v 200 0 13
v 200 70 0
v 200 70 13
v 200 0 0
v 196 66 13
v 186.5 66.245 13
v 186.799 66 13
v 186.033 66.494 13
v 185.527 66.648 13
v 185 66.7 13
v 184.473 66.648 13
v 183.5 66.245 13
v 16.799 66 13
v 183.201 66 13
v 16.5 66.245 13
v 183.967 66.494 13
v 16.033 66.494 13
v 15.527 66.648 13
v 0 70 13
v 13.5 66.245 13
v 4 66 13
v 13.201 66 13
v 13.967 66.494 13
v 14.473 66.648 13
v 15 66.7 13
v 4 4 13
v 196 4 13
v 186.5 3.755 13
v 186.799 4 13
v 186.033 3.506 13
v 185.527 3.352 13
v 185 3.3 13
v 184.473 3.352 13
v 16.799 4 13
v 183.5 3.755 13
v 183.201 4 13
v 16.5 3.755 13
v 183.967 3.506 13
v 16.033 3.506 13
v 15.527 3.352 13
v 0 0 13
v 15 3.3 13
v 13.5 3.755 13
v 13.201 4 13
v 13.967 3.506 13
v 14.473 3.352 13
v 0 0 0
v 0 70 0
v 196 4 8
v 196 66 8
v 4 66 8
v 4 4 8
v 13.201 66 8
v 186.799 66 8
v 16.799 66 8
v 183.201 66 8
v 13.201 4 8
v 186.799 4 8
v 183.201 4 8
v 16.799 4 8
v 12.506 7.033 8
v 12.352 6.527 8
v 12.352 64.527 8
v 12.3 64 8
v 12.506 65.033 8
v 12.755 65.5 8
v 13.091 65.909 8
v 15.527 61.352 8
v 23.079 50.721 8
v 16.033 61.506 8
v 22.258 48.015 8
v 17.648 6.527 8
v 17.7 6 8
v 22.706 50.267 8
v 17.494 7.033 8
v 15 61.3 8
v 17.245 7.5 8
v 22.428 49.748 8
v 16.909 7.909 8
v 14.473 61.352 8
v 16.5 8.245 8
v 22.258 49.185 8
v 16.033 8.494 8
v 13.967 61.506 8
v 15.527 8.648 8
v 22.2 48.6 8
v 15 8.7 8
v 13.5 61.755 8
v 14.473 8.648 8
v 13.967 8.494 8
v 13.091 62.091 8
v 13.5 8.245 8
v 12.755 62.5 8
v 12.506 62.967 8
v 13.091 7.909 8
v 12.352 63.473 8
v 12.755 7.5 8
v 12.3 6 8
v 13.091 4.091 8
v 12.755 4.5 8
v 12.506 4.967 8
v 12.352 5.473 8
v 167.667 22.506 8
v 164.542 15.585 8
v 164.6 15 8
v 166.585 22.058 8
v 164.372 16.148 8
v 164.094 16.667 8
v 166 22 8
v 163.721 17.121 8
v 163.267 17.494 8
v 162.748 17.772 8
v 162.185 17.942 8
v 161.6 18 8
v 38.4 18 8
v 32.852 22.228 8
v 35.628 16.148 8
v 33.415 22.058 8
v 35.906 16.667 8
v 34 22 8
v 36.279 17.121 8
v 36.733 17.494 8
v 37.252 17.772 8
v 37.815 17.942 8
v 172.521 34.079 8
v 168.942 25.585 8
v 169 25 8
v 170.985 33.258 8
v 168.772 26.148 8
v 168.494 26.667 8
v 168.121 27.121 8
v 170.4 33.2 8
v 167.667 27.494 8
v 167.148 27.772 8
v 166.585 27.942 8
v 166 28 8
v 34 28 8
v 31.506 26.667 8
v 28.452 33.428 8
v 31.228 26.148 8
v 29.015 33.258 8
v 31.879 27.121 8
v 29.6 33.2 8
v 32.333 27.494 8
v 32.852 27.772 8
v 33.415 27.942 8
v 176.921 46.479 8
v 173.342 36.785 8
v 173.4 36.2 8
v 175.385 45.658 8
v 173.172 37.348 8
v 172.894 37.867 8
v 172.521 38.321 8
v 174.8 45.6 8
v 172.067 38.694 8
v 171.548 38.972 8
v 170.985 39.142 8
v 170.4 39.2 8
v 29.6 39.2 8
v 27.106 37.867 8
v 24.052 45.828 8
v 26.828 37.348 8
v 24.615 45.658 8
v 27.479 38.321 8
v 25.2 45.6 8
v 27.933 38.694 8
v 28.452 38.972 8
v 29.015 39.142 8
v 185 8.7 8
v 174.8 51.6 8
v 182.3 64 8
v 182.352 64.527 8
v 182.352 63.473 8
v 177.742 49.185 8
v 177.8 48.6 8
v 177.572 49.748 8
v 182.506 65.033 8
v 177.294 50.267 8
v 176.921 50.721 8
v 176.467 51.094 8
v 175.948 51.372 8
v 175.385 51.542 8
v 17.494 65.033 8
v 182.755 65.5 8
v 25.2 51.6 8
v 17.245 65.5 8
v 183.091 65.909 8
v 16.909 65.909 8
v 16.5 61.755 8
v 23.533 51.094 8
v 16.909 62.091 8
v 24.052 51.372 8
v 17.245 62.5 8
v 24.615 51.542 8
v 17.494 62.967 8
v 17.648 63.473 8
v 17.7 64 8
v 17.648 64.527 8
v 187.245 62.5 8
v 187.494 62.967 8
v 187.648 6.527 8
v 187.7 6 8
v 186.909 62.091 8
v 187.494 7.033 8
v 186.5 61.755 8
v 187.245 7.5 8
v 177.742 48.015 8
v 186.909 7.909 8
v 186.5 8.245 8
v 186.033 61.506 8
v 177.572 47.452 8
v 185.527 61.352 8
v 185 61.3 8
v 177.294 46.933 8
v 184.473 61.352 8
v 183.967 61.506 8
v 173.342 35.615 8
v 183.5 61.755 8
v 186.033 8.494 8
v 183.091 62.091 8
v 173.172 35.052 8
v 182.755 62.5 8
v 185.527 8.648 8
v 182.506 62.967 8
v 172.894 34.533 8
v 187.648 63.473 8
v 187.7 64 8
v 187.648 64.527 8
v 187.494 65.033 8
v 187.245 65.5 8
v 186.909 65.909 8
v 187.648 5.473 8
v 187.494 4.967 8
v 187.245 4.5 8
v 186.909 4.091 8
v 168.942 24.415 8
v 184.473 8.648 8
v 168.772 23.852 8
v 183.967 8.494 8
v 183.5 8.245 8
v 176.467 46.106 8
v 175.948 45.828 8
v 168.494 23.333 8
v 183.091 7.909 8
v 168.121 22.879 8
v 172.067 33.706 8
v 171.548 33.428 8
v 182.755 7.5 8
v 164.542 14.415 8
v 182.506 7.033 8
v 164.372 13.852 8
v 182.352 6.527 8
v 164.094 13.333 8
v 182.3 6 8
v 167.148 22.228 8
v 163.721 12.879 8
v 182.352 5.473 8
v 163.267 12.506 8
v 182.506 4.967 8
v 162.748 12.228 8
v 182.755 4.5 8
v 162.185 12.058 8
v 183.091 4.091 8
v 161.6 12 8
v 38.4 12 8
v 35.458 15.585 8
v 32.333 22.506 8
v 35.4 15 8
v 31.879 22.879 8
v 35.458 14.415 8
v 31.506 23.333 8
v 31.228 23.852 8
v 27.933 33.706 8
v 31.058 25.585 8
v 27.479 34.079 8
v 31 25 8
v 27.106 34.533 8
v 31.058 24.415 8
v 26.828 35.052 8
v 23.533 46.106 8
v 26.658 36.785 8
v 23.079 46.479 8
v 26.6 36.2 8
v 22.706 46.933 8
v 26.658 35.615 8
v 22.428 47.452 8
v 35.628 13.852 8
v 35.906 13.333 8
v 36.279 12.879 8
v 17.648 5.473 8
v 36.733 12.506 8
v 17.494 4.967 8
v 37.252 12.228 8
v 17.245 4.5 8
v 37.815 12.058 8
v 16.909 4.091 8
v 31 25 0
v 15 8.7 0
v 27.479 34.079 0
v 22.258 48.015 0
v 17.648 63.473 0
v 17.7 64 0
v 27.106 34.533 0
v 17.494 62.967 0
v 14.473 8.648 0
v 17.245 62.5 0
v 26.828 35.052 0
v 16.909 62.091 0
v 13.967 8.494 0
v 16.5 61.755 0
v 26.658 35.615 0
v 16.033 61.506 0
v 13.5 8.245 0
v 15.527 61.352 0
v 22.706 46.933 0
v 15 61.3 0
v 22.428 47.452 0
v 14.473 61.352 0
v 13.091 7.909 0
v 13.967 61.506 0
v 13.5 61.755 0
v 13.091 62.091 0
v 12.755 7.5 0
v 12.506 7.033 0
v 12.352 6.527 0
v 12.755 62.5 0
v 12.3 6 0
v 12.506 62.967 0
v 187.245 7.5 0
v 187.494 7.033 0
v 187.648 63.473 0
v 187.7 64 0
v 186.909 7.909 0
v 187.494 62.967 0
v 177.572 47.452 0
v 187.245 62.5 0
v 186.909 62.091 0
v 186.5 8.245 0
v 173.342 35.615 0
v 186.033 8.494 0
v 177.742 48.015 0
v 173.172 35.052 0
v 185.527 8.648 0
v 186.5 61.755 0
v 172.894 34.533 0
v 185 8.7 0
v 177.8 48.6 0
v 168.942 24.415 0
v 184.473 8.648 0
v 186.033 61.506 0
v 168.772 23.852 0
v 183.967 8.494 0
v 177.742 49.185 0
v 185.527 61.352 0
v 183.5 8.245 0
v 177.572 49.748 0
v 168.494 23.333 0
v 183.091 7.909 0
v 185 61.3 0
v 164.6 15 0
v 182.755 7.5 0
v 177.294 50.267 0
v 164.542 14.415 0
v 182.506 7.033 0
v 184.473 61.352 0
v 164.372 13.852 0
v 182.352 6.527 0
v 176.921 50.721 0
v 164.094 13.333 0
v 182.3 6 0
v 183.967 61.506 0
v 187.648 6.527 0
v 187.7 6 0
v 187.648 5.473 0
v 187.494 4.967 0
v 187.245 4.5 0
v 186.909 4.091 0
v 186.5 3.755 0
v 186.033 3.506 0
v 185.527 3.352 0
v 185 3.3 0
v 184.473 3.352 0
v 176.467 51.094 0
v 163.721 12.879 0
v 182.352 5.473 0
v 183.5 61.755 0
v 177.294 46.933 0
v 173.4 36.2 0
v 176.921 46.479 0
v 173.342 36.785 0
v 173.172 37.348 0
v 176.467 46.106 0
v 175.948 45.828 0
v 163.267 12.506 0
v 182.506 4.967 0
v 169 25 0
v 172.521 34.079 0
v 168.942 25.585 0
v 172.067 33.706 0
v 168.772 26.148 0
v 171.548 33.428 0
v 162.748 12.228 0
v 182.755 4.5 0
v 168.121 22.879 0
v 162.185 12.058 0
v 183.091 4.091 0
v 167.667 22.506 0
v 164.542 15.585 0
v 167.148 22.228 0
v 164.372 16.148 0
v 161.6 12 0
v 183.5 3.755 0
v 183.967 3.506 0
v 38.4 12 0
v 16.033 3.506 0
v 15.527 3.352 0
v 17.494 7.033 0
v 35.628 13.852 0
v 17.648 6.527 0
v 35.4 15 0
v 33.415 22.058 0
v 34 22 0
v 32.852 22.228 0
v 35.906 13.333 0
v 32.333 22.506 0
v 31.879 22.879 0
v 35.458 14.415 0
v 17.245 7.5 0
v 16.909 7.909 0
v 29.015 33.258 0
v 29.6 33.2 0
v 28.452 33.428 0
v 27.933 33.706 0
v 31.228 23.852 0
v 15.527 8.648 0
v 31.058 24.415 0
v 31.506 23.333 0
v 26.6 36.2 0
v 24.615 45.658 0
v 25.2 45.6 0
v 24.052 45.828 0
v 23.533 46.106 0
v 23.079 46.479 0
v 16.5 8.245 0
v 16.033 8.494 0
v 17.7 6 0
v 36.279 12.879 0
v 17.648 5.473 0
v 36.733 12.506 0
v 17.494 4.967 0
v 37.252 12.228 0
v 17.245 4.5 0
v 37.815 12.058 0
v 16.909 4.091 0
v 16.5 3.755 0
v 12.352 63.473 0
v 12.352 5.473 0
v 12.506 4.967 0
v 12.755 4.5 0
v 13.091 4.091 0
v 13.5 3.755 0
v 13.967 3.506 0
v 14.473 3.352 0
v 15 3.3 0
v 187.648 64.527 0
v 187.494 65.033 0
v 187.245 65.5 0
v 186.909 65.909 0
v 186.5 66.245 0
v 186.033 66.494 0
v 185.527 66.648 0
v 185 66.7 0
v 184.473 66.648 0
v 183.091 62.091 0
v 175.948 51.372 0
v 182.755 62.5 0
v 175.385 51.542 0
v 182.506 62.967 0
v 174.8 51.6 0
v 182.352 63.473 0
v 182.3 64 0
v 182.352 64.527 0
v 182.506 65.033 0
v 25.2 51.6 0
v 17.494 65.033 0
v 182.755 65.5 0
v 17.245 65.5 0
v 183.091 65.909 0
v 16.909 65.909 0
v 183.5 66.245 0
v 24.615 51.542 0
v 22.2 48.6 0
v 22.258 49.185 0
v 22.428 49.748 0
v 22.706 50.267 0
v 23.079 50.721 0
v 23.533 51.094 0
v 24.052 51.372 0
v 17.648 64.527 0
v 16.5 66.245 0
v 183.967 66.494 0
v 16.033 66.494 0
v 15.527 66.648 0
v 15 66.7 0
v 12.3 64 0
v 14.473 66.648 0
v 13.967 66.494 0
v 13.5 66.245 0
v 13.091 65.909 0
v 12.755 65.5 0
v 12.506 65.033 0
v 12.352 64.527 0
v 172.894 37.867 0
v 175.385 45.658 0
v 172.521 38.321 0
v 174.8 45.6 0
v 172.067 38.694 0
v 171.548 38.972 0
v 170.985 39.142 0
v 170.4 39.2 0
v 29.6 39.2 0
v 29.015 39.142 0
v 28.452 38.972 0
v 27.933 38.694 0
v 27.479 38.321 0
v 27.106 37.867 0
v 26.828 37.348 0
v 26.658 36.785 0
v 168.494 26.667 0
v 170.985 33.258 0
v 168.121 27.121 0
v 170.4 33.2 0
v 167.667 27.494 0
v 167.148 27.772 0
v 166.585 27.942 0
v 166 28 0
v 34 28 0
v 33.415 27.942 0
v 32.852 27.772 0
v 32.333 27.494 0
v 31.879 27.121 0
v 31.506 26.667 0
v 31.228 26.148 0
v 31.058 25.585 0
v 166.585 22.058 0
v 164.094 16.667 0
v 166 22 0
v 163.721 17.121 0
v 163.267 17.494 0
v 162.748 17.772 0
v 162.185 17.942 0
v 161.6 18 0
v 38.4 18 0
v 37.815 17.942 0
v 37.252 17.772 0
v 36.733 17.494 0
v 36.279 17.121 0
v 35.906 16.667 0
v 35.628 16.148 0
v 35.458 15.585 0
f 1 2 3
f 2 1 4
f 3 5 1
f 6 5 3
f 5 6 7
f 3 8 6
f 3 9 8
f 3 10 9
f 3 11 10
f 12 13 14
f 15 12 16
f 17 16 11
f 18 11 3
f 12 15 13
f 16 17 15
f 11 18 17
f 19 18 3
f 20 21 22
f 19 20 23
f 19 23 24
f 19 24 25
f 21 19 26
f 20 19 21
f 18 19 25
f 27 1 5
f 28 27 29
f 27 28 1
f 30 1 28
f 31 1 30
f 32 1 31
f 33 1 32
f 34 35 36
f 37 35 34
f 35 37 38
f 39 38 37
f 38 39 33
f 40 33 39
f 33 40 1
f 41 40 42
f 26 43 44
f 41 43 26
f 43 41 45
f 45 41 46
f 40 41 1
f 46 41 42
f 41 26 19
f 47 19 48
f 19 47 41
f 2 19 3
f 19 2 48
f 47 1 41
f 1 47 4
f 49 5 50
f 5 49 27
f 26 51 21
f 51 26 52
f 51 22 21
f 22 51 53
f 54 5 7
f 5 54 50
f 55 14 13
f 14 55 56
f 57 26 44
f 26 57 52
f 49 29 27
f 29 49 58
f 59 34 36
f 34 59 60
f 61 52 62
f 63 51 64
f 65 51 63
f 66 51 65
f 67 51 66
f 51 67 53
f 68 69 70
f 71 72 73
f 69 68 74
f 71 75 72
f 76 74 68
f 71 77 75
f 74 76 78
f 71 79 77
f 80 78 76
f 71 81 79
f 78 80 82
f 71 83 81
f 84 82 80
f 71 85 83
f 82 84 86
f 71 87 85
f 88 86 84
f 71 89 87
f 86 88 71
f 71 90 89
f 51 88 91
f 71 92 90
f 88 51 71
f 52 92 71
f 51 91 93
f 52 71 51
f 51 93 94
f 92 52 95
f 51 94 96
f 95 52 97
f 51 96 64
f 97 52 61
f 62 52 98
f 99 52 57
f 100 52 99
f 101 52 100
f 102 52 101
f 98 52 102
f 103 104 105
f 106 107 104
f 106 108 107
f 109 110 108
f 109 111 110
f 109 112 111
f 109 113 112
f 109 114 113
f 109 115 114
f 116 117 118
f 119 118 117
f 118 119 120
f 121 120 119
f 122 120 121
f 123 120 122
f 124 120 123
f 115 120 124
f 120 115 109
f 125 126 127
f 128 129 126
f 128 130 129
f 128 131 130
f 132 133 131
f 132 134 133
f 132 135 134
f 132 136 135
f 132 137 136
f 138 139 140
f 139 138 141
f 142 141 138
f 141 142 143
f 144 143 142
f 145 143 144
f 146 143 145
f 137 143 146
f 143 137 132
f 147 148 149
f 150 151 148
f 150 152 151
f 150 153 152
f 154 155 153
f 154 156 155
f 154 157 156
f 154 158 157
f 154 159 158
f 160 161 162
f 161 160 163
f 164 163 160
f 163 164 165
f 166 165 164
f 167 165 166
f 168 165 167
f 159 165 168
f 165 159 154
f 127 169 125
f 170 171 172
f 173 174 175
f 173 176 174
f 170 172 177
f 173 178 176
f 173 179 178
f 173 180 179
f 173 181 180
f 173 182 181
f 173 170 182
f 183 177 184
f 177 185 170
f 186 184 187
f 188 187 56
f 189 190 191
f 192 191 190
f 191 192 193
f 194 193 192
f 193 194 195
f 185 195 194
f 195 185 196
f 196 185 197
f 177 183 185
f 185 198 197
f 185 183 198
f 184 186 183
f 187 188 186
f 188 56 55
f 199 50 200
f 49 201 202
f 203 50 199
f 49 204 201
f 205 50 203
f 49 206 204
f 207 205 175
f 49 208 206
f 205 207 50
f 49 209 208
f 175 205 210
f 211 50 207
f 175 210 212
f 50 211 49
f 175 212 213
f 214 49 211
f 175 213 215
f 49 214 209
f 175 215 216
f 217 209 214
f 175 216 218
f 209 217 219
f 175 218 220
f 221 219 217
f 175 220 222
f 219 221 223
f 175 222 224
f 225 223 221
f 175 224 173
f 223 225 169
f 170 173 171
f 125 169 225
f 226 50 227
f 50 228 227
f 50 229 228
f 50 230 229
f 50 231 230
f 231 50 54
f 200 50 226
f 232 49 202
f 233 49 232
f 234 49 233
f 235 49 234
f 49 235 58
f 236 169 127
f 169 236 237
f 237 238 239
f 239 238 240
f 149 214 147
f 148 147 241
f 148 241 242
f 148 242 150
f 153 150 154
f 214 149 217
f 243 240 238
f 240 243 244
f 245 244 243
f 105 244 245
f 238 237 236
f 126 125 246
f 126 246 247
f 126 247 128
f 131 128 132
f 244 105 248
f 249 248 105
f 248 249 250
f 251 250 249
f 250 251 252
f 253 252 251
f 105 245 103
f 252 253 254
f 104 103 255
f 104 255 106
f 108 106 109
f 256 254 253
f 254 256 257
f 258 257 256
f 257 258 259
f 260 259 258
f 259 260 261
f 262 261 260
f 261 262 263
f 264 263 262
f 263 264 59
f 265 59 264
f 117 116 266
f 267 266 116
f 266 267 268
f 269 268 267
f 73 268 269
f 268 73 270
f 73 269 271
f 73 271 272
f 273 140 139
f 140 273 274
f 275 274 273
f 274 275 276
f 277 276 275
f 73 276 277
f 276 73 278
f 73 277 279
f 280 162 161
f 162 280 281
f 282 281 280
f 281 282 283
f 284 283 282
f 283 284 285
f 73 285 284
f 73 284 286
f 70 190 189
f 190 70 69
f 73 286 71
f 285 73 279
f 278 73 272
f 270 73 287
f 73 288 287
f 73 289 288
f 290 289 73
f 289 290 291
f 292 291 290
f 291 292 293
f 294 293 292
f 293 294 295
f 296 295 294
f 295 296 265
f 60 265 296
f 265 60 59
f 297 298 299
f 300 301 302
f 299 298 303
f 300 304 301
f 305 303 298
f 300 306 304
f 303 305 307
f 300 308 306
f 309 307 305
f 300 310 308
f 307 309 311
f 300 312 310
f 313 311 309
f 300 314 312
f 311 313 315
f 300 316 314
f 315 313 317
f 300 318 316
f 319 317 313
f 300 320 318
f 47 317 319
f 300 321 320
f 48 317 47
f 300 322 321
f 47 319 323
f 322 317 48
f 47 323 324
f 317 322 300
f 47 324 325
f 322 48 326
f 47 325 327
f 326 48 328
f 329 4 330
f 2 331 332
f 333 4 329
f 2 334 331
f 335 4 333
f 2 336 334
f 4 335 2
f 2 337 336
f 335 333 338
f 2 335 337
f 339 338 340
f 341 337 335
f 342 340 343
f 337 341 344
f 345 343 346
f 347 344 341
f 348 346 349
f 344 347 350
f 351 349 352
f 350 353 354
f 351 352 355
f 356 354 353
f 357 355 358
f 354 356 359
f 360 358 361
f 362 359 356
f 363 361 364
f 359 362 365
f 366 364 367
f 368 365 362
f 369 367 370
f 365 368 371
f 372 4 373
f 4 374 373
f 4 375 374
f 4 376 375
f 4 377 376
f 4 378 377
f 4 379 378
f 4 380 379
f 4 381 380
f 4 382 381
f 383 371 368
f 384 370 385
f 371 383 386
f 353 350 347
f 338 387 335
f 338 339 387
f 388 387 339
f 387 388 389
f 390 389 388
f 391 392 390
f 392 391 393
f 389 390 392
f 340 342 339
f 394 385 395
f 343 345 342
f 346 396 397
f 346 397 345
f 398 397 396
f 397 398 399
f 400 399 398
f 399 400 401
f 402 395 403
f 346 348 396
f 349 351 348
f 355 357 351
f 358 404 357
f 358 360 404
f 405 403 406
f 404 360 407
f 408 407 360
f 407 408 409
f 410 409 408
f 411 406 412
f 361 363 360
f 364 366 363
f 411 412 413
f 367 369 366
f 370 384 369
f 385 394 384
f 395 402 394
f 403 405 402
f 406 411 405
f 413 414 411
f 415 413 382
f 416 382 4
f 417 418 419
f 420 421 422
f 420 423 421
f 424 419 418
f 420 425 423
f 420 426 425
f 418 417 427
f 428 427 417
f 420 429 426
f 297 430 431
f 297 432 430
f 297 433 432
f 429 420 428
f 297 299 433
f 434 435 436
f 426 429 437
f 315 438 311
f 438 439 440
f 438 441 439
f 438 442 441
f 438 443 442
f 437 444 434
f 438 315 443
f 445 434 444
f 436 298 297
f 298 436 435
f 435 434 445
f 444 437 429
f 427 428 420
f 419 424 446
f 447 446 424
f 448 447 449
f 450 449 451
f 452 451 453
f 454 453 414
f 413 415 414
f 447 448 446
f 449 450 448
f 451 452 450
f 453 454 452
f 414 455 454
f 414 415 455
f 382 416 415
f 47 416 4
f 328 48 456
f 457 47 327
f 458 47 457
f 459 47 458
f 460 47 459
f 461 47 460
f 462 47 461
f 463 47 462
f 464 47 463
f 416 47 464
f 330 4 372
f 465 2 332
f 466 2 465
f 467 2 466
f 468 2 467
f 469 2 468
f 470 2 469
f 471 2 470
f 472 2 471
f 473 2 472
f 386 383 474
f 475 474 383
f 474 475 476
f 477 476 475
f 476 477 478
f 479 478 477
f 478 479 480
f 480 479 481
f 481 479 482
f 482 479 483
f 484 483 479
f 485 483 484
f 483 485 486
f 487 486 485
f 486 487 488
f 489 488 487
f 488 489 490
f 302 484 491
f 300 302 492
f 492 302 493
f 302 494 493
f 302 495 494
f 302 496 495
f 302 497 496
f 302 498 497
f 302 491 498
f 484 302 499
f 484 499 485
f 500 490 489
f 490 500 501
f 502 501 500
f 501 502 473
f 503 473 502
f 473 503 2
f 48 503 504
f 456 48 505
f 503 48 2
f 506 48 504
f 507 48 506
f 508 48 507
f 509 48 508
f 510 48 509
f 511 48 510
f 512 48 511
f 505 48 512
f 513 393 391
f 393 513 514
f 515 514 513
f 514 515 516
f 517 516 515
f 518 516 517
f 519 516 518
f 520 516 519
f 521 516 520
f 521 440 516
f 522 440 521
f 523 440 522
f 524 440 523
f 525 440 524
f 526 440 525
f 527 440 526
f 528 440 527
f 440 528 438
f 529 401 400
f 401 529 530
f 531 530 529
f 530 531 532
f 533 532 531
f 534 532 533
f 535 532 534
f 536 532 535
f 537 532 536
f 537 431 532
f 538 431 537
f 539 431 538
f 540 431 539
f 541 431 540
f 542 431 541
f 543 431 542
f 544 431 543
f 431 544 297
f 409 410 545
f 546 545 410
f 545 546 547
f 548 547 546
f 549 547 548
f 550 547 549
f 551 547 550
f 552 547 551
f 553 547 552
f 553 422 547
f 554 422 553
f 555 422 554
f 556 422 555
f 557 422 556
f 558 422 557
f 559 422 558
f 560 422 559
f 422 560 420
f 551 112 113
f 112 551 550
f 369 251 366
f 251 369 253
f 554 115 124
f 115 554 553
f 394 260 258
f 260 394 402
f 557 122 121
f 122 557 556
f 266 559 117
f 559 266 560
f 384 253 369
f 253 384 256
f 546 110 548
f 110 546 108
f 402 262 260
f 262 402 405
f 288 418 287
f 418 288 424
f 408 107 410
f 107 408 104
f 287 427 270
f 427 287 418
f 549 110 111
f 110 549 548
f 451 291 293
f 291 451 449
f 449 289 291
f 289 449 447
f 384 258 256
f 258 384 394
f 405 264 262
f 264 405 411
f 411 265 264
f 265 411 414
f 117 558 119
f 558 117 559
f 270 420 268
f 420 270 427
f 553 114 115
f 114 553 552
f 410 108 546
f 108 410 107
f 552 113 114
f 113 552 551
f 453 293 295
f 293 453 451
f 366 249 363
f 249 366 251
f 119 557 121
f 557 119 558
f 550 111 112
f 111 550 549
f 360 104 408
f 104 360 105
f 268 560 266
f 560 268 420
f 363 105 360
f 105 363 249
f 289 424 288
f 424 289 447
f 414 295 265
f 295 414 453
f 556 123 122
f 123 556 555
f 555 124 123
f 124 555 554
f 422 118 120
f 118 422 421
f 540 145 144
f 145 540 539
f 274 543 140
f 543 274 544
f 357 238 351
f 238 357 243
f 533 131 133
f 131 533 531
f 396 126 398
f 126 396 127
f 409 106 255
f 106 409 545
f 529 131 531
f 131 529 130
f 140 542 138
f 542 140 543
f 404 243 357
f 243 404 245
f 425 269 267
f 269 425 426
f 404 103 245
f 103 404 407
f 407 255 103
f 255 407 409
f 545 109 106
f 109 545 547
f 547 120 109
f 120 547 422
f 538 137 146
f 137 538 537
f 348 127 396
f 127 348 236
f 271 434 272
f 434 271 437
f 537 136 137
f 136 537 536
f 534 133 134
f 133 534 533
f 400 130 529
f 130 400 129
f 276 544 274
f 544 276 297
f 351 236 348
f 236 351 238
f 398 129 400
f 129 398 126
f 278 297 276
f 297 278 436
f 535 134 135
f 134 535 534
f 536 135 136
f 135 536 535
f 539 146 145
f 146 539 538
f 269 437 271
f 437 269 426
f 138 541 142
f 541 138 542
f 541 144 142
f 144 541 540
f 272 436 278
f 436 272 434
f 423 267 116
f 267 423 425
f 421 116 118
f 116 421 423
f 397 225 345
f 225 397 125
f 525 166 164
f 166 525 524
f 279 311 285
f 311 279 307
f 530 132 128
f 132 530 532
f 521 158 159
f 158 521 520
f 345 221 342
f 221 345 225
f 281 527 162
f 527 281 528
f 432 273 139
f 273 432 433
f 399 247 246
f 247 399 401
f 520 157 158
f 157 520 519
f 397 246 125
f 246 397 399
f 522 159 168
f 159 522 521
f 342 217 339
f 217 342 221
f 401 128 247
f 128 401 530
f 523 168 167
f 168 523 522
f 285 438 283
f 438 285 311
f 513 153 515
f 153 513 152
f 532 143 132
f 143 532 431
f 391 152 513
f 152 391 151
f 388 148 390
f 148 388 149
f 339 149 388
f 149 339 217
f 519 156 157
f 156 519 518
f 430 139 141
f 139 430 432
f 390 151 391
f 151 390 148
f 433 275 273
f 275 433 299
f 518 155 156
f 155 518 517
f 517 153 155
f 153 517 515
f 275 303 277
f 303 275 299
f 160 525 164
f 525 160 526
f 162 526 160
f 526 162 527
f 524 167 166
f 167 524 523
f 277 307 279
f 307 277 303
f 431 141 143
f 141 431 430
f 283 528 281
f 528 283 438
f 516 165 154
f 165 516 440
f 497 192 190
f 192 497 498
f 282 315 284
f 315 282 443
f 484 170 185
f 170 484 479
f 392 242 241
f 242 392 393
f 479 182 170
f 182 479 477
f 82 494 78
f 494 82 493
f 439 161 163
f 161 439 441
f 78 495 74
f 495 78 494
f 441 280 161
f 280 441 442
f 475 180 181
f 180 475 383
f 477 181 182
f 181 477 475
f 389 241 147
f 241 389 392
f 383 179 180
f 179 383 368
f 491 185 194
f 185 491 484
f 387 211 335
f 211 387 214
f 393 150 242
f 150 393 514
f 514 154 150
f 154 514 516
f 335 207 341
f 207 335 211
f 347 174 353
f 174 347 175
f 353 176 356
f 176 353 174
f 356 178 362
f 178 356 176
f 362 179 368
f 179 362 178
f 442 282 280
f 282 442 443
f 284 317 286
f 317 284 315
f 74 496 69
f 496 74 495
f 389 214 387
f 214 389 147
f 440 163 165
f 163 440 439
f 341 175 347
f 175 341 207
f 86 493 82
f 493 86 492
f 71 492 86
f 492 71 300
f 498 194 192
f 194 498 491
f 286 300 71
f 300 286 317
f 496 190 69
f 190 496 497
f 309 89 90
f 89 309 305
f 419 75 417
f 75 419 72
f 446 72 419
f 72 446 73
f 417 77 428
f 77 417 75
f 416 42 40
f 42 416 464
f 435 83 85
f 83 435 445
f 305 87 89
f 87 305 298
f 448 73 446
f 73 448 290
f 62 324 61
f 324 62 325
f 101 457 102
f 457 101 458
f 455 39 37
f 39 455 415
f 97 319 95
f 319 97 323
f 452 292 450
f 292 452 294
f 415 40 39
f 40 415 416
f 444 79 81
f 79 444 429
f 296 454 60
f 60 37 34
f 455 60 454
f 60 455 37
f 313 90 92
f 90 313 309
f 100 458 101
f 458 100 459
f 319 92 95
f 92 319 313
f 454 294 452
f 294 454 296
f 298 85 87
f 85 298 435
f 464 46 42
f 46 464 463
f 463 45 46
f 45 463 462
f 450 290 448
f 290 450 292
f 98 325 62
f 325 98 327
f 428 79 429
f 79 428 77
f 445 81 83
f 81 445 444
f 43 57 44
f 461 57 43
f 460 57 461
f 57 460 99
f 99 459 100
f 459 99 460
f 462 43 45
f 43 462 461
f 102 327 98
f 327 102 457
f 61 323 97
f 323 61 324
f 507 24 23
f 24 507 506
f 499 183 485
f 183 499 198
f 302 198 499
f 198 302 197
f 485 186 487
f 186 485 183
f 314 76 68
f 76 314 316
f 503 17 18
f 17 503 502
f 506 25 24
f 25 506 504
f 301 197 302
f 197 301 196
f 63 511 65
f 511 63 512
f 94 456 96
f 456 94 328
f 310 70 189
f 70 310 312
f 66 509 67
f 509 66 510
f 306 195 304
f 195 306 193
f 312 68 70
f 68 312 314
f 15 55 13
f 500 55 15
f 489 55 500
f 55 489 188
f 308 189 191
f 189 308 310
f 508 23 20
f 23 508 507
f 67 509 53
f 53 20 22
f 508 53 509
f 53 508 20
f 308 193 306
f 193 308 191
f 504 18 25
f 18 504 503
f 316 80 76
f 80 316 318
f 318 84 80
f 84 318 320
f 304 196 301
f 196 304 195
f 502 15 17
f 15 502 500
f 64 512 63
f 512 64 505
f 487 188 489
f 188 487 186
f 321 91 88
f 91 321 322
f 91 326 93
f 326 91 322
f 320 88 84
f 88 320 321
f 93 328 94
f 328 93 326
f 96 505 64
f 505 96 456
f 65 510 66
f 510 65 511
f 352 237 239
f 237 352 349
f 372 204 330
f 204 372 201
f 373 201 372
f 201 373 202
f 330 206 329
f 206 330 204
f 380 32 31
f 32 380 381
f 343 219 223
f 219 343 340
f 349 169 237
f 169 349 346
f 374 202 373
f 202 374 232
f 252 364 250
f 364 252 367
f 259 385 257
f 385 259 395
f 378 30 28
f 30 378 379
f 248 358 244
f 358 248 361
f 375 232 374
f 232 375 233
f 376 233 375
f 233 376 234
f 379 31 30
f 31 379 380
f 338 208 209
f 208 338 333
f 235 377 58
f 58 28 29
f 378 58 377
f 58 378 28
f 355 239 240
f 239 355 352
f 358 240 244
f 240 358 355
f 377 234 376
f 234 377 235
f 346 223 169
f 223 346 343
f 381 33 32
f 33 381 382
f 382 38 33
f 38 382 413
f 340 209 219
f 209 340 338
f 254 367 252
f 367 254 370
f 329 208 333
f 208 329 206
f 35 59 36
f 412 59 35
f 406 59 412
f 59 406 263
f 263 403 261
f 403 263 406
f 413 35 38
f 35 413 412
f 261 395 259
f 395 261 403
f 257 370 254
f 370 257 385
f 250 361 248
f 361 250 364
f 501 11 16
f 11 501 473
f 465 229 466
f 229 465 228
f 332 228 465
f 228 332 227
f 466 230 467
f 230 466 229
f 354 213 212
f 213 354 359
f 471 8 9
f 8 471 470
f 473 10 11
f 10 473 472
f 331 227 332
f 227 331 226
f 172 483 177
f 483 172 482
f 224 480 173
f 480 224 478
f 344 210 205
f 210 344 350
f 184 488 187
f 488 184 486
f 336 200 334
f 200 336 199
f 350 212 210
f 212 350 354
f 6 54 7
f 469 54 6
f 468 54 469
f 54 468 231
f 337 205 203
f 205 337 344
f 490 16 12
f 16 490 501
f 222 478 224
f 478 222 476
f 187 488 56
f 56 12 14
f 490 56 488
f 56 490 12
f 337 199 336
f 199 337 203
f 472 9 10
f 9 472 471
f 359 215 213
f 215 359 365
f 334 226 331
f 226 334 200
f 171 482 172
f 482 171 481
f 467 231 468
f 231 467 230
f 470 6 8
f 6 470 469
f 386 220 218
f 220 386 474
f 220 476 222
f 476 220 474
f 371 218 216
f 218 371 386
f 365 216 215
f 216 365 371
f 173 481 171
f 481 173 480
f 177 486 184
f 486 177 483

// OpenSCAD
$fn = 32;

// ----------------------------------------------------------------------
// Slotted panel: 200 x 70 mm, 4 ряда of slots
// ----------------------------------------------------------------------

// --- parameters (mm) ---
panel_w = 200;            // panel width
panel_d = 70;             // panel depth
thick = 8;                // panel thickness
slot_w = 6;               // slot width
pitch0 = 10;              // first row pitch
pitch_step = 1.2;         // pitch increase per row
margin = 12;              // margin around the slot field
rows = 4;                 // number of slot rows
mount_d = 5.4;            // mounting holes
mount_x = 85;             // mounting hole offset
rim_h = 13;               // rim height
rim_t = 4;                // rim wall thickness

difference() {
  union() {
    cube([panel_w, panel_d, thick]);
    translate([0, 0, thick - 1]) difference() {
      cube([panel_w, panel_d, rim_h - thick + 1]);
      translate([rim_t, rim_t, -2.5]) cube([panel_w - 2 * rim_t, panel_d - 2 * rim_t, rim_h - thick + 6]);
    }
  }
  /* slot rows: stadium shaped cutters, 2.5 mm clear of both faces */
  /* row 0: pitch 10, length 123.2 */
  hull() {
    translate([38.4, 15, -2.5]) cylinder(h = thick + 5, d = slot_w);
    translate([161.6, 15, -2.5]) cylinder(h = thick + 5, d = slot_w);
  }
  /* row 1: pitch 11.2, length 132 */
  hull() {
    translate([34, 25, -2.5]) cylinder(h = thick + 5, d = slot_w);
    translate([166, 25, -2.5]) cylinder(h = thick + 5, d = slot_w);
  }
  /* row 2: pitch 12.4, length 140.8 */
  hull() {
    translate([29.6, 36.2, -2.5]) cylinder(h = thick + 5, d = slot_w);
    translate([170.4, 36.2, -2.5]) cylinder(h = thick + 5, d = slot_w);
  }
  /* row 3: pitch 13.6, length 149.6 */
  hull() {
    translate([25.2, 48.6, -2.5]) cylinder(h = thick + 5, d = slot_w);
    translate([174.8, 48.6, -2.5]) cylinder(h = thick + 5, d = slot_w);
  }
  translate([15, 6, -2.5]) cylinder(h = 18, d = mount_d);
  translate([15, 64, -2.5]) cylinder(h = 18, d = mount_d);
  translate([185, 6, -2.5]) cylinder(h = 18, d = mount_d);
  translate([185, 64, -2.5]) cylinder(h = 18, d = mount_d);
}
